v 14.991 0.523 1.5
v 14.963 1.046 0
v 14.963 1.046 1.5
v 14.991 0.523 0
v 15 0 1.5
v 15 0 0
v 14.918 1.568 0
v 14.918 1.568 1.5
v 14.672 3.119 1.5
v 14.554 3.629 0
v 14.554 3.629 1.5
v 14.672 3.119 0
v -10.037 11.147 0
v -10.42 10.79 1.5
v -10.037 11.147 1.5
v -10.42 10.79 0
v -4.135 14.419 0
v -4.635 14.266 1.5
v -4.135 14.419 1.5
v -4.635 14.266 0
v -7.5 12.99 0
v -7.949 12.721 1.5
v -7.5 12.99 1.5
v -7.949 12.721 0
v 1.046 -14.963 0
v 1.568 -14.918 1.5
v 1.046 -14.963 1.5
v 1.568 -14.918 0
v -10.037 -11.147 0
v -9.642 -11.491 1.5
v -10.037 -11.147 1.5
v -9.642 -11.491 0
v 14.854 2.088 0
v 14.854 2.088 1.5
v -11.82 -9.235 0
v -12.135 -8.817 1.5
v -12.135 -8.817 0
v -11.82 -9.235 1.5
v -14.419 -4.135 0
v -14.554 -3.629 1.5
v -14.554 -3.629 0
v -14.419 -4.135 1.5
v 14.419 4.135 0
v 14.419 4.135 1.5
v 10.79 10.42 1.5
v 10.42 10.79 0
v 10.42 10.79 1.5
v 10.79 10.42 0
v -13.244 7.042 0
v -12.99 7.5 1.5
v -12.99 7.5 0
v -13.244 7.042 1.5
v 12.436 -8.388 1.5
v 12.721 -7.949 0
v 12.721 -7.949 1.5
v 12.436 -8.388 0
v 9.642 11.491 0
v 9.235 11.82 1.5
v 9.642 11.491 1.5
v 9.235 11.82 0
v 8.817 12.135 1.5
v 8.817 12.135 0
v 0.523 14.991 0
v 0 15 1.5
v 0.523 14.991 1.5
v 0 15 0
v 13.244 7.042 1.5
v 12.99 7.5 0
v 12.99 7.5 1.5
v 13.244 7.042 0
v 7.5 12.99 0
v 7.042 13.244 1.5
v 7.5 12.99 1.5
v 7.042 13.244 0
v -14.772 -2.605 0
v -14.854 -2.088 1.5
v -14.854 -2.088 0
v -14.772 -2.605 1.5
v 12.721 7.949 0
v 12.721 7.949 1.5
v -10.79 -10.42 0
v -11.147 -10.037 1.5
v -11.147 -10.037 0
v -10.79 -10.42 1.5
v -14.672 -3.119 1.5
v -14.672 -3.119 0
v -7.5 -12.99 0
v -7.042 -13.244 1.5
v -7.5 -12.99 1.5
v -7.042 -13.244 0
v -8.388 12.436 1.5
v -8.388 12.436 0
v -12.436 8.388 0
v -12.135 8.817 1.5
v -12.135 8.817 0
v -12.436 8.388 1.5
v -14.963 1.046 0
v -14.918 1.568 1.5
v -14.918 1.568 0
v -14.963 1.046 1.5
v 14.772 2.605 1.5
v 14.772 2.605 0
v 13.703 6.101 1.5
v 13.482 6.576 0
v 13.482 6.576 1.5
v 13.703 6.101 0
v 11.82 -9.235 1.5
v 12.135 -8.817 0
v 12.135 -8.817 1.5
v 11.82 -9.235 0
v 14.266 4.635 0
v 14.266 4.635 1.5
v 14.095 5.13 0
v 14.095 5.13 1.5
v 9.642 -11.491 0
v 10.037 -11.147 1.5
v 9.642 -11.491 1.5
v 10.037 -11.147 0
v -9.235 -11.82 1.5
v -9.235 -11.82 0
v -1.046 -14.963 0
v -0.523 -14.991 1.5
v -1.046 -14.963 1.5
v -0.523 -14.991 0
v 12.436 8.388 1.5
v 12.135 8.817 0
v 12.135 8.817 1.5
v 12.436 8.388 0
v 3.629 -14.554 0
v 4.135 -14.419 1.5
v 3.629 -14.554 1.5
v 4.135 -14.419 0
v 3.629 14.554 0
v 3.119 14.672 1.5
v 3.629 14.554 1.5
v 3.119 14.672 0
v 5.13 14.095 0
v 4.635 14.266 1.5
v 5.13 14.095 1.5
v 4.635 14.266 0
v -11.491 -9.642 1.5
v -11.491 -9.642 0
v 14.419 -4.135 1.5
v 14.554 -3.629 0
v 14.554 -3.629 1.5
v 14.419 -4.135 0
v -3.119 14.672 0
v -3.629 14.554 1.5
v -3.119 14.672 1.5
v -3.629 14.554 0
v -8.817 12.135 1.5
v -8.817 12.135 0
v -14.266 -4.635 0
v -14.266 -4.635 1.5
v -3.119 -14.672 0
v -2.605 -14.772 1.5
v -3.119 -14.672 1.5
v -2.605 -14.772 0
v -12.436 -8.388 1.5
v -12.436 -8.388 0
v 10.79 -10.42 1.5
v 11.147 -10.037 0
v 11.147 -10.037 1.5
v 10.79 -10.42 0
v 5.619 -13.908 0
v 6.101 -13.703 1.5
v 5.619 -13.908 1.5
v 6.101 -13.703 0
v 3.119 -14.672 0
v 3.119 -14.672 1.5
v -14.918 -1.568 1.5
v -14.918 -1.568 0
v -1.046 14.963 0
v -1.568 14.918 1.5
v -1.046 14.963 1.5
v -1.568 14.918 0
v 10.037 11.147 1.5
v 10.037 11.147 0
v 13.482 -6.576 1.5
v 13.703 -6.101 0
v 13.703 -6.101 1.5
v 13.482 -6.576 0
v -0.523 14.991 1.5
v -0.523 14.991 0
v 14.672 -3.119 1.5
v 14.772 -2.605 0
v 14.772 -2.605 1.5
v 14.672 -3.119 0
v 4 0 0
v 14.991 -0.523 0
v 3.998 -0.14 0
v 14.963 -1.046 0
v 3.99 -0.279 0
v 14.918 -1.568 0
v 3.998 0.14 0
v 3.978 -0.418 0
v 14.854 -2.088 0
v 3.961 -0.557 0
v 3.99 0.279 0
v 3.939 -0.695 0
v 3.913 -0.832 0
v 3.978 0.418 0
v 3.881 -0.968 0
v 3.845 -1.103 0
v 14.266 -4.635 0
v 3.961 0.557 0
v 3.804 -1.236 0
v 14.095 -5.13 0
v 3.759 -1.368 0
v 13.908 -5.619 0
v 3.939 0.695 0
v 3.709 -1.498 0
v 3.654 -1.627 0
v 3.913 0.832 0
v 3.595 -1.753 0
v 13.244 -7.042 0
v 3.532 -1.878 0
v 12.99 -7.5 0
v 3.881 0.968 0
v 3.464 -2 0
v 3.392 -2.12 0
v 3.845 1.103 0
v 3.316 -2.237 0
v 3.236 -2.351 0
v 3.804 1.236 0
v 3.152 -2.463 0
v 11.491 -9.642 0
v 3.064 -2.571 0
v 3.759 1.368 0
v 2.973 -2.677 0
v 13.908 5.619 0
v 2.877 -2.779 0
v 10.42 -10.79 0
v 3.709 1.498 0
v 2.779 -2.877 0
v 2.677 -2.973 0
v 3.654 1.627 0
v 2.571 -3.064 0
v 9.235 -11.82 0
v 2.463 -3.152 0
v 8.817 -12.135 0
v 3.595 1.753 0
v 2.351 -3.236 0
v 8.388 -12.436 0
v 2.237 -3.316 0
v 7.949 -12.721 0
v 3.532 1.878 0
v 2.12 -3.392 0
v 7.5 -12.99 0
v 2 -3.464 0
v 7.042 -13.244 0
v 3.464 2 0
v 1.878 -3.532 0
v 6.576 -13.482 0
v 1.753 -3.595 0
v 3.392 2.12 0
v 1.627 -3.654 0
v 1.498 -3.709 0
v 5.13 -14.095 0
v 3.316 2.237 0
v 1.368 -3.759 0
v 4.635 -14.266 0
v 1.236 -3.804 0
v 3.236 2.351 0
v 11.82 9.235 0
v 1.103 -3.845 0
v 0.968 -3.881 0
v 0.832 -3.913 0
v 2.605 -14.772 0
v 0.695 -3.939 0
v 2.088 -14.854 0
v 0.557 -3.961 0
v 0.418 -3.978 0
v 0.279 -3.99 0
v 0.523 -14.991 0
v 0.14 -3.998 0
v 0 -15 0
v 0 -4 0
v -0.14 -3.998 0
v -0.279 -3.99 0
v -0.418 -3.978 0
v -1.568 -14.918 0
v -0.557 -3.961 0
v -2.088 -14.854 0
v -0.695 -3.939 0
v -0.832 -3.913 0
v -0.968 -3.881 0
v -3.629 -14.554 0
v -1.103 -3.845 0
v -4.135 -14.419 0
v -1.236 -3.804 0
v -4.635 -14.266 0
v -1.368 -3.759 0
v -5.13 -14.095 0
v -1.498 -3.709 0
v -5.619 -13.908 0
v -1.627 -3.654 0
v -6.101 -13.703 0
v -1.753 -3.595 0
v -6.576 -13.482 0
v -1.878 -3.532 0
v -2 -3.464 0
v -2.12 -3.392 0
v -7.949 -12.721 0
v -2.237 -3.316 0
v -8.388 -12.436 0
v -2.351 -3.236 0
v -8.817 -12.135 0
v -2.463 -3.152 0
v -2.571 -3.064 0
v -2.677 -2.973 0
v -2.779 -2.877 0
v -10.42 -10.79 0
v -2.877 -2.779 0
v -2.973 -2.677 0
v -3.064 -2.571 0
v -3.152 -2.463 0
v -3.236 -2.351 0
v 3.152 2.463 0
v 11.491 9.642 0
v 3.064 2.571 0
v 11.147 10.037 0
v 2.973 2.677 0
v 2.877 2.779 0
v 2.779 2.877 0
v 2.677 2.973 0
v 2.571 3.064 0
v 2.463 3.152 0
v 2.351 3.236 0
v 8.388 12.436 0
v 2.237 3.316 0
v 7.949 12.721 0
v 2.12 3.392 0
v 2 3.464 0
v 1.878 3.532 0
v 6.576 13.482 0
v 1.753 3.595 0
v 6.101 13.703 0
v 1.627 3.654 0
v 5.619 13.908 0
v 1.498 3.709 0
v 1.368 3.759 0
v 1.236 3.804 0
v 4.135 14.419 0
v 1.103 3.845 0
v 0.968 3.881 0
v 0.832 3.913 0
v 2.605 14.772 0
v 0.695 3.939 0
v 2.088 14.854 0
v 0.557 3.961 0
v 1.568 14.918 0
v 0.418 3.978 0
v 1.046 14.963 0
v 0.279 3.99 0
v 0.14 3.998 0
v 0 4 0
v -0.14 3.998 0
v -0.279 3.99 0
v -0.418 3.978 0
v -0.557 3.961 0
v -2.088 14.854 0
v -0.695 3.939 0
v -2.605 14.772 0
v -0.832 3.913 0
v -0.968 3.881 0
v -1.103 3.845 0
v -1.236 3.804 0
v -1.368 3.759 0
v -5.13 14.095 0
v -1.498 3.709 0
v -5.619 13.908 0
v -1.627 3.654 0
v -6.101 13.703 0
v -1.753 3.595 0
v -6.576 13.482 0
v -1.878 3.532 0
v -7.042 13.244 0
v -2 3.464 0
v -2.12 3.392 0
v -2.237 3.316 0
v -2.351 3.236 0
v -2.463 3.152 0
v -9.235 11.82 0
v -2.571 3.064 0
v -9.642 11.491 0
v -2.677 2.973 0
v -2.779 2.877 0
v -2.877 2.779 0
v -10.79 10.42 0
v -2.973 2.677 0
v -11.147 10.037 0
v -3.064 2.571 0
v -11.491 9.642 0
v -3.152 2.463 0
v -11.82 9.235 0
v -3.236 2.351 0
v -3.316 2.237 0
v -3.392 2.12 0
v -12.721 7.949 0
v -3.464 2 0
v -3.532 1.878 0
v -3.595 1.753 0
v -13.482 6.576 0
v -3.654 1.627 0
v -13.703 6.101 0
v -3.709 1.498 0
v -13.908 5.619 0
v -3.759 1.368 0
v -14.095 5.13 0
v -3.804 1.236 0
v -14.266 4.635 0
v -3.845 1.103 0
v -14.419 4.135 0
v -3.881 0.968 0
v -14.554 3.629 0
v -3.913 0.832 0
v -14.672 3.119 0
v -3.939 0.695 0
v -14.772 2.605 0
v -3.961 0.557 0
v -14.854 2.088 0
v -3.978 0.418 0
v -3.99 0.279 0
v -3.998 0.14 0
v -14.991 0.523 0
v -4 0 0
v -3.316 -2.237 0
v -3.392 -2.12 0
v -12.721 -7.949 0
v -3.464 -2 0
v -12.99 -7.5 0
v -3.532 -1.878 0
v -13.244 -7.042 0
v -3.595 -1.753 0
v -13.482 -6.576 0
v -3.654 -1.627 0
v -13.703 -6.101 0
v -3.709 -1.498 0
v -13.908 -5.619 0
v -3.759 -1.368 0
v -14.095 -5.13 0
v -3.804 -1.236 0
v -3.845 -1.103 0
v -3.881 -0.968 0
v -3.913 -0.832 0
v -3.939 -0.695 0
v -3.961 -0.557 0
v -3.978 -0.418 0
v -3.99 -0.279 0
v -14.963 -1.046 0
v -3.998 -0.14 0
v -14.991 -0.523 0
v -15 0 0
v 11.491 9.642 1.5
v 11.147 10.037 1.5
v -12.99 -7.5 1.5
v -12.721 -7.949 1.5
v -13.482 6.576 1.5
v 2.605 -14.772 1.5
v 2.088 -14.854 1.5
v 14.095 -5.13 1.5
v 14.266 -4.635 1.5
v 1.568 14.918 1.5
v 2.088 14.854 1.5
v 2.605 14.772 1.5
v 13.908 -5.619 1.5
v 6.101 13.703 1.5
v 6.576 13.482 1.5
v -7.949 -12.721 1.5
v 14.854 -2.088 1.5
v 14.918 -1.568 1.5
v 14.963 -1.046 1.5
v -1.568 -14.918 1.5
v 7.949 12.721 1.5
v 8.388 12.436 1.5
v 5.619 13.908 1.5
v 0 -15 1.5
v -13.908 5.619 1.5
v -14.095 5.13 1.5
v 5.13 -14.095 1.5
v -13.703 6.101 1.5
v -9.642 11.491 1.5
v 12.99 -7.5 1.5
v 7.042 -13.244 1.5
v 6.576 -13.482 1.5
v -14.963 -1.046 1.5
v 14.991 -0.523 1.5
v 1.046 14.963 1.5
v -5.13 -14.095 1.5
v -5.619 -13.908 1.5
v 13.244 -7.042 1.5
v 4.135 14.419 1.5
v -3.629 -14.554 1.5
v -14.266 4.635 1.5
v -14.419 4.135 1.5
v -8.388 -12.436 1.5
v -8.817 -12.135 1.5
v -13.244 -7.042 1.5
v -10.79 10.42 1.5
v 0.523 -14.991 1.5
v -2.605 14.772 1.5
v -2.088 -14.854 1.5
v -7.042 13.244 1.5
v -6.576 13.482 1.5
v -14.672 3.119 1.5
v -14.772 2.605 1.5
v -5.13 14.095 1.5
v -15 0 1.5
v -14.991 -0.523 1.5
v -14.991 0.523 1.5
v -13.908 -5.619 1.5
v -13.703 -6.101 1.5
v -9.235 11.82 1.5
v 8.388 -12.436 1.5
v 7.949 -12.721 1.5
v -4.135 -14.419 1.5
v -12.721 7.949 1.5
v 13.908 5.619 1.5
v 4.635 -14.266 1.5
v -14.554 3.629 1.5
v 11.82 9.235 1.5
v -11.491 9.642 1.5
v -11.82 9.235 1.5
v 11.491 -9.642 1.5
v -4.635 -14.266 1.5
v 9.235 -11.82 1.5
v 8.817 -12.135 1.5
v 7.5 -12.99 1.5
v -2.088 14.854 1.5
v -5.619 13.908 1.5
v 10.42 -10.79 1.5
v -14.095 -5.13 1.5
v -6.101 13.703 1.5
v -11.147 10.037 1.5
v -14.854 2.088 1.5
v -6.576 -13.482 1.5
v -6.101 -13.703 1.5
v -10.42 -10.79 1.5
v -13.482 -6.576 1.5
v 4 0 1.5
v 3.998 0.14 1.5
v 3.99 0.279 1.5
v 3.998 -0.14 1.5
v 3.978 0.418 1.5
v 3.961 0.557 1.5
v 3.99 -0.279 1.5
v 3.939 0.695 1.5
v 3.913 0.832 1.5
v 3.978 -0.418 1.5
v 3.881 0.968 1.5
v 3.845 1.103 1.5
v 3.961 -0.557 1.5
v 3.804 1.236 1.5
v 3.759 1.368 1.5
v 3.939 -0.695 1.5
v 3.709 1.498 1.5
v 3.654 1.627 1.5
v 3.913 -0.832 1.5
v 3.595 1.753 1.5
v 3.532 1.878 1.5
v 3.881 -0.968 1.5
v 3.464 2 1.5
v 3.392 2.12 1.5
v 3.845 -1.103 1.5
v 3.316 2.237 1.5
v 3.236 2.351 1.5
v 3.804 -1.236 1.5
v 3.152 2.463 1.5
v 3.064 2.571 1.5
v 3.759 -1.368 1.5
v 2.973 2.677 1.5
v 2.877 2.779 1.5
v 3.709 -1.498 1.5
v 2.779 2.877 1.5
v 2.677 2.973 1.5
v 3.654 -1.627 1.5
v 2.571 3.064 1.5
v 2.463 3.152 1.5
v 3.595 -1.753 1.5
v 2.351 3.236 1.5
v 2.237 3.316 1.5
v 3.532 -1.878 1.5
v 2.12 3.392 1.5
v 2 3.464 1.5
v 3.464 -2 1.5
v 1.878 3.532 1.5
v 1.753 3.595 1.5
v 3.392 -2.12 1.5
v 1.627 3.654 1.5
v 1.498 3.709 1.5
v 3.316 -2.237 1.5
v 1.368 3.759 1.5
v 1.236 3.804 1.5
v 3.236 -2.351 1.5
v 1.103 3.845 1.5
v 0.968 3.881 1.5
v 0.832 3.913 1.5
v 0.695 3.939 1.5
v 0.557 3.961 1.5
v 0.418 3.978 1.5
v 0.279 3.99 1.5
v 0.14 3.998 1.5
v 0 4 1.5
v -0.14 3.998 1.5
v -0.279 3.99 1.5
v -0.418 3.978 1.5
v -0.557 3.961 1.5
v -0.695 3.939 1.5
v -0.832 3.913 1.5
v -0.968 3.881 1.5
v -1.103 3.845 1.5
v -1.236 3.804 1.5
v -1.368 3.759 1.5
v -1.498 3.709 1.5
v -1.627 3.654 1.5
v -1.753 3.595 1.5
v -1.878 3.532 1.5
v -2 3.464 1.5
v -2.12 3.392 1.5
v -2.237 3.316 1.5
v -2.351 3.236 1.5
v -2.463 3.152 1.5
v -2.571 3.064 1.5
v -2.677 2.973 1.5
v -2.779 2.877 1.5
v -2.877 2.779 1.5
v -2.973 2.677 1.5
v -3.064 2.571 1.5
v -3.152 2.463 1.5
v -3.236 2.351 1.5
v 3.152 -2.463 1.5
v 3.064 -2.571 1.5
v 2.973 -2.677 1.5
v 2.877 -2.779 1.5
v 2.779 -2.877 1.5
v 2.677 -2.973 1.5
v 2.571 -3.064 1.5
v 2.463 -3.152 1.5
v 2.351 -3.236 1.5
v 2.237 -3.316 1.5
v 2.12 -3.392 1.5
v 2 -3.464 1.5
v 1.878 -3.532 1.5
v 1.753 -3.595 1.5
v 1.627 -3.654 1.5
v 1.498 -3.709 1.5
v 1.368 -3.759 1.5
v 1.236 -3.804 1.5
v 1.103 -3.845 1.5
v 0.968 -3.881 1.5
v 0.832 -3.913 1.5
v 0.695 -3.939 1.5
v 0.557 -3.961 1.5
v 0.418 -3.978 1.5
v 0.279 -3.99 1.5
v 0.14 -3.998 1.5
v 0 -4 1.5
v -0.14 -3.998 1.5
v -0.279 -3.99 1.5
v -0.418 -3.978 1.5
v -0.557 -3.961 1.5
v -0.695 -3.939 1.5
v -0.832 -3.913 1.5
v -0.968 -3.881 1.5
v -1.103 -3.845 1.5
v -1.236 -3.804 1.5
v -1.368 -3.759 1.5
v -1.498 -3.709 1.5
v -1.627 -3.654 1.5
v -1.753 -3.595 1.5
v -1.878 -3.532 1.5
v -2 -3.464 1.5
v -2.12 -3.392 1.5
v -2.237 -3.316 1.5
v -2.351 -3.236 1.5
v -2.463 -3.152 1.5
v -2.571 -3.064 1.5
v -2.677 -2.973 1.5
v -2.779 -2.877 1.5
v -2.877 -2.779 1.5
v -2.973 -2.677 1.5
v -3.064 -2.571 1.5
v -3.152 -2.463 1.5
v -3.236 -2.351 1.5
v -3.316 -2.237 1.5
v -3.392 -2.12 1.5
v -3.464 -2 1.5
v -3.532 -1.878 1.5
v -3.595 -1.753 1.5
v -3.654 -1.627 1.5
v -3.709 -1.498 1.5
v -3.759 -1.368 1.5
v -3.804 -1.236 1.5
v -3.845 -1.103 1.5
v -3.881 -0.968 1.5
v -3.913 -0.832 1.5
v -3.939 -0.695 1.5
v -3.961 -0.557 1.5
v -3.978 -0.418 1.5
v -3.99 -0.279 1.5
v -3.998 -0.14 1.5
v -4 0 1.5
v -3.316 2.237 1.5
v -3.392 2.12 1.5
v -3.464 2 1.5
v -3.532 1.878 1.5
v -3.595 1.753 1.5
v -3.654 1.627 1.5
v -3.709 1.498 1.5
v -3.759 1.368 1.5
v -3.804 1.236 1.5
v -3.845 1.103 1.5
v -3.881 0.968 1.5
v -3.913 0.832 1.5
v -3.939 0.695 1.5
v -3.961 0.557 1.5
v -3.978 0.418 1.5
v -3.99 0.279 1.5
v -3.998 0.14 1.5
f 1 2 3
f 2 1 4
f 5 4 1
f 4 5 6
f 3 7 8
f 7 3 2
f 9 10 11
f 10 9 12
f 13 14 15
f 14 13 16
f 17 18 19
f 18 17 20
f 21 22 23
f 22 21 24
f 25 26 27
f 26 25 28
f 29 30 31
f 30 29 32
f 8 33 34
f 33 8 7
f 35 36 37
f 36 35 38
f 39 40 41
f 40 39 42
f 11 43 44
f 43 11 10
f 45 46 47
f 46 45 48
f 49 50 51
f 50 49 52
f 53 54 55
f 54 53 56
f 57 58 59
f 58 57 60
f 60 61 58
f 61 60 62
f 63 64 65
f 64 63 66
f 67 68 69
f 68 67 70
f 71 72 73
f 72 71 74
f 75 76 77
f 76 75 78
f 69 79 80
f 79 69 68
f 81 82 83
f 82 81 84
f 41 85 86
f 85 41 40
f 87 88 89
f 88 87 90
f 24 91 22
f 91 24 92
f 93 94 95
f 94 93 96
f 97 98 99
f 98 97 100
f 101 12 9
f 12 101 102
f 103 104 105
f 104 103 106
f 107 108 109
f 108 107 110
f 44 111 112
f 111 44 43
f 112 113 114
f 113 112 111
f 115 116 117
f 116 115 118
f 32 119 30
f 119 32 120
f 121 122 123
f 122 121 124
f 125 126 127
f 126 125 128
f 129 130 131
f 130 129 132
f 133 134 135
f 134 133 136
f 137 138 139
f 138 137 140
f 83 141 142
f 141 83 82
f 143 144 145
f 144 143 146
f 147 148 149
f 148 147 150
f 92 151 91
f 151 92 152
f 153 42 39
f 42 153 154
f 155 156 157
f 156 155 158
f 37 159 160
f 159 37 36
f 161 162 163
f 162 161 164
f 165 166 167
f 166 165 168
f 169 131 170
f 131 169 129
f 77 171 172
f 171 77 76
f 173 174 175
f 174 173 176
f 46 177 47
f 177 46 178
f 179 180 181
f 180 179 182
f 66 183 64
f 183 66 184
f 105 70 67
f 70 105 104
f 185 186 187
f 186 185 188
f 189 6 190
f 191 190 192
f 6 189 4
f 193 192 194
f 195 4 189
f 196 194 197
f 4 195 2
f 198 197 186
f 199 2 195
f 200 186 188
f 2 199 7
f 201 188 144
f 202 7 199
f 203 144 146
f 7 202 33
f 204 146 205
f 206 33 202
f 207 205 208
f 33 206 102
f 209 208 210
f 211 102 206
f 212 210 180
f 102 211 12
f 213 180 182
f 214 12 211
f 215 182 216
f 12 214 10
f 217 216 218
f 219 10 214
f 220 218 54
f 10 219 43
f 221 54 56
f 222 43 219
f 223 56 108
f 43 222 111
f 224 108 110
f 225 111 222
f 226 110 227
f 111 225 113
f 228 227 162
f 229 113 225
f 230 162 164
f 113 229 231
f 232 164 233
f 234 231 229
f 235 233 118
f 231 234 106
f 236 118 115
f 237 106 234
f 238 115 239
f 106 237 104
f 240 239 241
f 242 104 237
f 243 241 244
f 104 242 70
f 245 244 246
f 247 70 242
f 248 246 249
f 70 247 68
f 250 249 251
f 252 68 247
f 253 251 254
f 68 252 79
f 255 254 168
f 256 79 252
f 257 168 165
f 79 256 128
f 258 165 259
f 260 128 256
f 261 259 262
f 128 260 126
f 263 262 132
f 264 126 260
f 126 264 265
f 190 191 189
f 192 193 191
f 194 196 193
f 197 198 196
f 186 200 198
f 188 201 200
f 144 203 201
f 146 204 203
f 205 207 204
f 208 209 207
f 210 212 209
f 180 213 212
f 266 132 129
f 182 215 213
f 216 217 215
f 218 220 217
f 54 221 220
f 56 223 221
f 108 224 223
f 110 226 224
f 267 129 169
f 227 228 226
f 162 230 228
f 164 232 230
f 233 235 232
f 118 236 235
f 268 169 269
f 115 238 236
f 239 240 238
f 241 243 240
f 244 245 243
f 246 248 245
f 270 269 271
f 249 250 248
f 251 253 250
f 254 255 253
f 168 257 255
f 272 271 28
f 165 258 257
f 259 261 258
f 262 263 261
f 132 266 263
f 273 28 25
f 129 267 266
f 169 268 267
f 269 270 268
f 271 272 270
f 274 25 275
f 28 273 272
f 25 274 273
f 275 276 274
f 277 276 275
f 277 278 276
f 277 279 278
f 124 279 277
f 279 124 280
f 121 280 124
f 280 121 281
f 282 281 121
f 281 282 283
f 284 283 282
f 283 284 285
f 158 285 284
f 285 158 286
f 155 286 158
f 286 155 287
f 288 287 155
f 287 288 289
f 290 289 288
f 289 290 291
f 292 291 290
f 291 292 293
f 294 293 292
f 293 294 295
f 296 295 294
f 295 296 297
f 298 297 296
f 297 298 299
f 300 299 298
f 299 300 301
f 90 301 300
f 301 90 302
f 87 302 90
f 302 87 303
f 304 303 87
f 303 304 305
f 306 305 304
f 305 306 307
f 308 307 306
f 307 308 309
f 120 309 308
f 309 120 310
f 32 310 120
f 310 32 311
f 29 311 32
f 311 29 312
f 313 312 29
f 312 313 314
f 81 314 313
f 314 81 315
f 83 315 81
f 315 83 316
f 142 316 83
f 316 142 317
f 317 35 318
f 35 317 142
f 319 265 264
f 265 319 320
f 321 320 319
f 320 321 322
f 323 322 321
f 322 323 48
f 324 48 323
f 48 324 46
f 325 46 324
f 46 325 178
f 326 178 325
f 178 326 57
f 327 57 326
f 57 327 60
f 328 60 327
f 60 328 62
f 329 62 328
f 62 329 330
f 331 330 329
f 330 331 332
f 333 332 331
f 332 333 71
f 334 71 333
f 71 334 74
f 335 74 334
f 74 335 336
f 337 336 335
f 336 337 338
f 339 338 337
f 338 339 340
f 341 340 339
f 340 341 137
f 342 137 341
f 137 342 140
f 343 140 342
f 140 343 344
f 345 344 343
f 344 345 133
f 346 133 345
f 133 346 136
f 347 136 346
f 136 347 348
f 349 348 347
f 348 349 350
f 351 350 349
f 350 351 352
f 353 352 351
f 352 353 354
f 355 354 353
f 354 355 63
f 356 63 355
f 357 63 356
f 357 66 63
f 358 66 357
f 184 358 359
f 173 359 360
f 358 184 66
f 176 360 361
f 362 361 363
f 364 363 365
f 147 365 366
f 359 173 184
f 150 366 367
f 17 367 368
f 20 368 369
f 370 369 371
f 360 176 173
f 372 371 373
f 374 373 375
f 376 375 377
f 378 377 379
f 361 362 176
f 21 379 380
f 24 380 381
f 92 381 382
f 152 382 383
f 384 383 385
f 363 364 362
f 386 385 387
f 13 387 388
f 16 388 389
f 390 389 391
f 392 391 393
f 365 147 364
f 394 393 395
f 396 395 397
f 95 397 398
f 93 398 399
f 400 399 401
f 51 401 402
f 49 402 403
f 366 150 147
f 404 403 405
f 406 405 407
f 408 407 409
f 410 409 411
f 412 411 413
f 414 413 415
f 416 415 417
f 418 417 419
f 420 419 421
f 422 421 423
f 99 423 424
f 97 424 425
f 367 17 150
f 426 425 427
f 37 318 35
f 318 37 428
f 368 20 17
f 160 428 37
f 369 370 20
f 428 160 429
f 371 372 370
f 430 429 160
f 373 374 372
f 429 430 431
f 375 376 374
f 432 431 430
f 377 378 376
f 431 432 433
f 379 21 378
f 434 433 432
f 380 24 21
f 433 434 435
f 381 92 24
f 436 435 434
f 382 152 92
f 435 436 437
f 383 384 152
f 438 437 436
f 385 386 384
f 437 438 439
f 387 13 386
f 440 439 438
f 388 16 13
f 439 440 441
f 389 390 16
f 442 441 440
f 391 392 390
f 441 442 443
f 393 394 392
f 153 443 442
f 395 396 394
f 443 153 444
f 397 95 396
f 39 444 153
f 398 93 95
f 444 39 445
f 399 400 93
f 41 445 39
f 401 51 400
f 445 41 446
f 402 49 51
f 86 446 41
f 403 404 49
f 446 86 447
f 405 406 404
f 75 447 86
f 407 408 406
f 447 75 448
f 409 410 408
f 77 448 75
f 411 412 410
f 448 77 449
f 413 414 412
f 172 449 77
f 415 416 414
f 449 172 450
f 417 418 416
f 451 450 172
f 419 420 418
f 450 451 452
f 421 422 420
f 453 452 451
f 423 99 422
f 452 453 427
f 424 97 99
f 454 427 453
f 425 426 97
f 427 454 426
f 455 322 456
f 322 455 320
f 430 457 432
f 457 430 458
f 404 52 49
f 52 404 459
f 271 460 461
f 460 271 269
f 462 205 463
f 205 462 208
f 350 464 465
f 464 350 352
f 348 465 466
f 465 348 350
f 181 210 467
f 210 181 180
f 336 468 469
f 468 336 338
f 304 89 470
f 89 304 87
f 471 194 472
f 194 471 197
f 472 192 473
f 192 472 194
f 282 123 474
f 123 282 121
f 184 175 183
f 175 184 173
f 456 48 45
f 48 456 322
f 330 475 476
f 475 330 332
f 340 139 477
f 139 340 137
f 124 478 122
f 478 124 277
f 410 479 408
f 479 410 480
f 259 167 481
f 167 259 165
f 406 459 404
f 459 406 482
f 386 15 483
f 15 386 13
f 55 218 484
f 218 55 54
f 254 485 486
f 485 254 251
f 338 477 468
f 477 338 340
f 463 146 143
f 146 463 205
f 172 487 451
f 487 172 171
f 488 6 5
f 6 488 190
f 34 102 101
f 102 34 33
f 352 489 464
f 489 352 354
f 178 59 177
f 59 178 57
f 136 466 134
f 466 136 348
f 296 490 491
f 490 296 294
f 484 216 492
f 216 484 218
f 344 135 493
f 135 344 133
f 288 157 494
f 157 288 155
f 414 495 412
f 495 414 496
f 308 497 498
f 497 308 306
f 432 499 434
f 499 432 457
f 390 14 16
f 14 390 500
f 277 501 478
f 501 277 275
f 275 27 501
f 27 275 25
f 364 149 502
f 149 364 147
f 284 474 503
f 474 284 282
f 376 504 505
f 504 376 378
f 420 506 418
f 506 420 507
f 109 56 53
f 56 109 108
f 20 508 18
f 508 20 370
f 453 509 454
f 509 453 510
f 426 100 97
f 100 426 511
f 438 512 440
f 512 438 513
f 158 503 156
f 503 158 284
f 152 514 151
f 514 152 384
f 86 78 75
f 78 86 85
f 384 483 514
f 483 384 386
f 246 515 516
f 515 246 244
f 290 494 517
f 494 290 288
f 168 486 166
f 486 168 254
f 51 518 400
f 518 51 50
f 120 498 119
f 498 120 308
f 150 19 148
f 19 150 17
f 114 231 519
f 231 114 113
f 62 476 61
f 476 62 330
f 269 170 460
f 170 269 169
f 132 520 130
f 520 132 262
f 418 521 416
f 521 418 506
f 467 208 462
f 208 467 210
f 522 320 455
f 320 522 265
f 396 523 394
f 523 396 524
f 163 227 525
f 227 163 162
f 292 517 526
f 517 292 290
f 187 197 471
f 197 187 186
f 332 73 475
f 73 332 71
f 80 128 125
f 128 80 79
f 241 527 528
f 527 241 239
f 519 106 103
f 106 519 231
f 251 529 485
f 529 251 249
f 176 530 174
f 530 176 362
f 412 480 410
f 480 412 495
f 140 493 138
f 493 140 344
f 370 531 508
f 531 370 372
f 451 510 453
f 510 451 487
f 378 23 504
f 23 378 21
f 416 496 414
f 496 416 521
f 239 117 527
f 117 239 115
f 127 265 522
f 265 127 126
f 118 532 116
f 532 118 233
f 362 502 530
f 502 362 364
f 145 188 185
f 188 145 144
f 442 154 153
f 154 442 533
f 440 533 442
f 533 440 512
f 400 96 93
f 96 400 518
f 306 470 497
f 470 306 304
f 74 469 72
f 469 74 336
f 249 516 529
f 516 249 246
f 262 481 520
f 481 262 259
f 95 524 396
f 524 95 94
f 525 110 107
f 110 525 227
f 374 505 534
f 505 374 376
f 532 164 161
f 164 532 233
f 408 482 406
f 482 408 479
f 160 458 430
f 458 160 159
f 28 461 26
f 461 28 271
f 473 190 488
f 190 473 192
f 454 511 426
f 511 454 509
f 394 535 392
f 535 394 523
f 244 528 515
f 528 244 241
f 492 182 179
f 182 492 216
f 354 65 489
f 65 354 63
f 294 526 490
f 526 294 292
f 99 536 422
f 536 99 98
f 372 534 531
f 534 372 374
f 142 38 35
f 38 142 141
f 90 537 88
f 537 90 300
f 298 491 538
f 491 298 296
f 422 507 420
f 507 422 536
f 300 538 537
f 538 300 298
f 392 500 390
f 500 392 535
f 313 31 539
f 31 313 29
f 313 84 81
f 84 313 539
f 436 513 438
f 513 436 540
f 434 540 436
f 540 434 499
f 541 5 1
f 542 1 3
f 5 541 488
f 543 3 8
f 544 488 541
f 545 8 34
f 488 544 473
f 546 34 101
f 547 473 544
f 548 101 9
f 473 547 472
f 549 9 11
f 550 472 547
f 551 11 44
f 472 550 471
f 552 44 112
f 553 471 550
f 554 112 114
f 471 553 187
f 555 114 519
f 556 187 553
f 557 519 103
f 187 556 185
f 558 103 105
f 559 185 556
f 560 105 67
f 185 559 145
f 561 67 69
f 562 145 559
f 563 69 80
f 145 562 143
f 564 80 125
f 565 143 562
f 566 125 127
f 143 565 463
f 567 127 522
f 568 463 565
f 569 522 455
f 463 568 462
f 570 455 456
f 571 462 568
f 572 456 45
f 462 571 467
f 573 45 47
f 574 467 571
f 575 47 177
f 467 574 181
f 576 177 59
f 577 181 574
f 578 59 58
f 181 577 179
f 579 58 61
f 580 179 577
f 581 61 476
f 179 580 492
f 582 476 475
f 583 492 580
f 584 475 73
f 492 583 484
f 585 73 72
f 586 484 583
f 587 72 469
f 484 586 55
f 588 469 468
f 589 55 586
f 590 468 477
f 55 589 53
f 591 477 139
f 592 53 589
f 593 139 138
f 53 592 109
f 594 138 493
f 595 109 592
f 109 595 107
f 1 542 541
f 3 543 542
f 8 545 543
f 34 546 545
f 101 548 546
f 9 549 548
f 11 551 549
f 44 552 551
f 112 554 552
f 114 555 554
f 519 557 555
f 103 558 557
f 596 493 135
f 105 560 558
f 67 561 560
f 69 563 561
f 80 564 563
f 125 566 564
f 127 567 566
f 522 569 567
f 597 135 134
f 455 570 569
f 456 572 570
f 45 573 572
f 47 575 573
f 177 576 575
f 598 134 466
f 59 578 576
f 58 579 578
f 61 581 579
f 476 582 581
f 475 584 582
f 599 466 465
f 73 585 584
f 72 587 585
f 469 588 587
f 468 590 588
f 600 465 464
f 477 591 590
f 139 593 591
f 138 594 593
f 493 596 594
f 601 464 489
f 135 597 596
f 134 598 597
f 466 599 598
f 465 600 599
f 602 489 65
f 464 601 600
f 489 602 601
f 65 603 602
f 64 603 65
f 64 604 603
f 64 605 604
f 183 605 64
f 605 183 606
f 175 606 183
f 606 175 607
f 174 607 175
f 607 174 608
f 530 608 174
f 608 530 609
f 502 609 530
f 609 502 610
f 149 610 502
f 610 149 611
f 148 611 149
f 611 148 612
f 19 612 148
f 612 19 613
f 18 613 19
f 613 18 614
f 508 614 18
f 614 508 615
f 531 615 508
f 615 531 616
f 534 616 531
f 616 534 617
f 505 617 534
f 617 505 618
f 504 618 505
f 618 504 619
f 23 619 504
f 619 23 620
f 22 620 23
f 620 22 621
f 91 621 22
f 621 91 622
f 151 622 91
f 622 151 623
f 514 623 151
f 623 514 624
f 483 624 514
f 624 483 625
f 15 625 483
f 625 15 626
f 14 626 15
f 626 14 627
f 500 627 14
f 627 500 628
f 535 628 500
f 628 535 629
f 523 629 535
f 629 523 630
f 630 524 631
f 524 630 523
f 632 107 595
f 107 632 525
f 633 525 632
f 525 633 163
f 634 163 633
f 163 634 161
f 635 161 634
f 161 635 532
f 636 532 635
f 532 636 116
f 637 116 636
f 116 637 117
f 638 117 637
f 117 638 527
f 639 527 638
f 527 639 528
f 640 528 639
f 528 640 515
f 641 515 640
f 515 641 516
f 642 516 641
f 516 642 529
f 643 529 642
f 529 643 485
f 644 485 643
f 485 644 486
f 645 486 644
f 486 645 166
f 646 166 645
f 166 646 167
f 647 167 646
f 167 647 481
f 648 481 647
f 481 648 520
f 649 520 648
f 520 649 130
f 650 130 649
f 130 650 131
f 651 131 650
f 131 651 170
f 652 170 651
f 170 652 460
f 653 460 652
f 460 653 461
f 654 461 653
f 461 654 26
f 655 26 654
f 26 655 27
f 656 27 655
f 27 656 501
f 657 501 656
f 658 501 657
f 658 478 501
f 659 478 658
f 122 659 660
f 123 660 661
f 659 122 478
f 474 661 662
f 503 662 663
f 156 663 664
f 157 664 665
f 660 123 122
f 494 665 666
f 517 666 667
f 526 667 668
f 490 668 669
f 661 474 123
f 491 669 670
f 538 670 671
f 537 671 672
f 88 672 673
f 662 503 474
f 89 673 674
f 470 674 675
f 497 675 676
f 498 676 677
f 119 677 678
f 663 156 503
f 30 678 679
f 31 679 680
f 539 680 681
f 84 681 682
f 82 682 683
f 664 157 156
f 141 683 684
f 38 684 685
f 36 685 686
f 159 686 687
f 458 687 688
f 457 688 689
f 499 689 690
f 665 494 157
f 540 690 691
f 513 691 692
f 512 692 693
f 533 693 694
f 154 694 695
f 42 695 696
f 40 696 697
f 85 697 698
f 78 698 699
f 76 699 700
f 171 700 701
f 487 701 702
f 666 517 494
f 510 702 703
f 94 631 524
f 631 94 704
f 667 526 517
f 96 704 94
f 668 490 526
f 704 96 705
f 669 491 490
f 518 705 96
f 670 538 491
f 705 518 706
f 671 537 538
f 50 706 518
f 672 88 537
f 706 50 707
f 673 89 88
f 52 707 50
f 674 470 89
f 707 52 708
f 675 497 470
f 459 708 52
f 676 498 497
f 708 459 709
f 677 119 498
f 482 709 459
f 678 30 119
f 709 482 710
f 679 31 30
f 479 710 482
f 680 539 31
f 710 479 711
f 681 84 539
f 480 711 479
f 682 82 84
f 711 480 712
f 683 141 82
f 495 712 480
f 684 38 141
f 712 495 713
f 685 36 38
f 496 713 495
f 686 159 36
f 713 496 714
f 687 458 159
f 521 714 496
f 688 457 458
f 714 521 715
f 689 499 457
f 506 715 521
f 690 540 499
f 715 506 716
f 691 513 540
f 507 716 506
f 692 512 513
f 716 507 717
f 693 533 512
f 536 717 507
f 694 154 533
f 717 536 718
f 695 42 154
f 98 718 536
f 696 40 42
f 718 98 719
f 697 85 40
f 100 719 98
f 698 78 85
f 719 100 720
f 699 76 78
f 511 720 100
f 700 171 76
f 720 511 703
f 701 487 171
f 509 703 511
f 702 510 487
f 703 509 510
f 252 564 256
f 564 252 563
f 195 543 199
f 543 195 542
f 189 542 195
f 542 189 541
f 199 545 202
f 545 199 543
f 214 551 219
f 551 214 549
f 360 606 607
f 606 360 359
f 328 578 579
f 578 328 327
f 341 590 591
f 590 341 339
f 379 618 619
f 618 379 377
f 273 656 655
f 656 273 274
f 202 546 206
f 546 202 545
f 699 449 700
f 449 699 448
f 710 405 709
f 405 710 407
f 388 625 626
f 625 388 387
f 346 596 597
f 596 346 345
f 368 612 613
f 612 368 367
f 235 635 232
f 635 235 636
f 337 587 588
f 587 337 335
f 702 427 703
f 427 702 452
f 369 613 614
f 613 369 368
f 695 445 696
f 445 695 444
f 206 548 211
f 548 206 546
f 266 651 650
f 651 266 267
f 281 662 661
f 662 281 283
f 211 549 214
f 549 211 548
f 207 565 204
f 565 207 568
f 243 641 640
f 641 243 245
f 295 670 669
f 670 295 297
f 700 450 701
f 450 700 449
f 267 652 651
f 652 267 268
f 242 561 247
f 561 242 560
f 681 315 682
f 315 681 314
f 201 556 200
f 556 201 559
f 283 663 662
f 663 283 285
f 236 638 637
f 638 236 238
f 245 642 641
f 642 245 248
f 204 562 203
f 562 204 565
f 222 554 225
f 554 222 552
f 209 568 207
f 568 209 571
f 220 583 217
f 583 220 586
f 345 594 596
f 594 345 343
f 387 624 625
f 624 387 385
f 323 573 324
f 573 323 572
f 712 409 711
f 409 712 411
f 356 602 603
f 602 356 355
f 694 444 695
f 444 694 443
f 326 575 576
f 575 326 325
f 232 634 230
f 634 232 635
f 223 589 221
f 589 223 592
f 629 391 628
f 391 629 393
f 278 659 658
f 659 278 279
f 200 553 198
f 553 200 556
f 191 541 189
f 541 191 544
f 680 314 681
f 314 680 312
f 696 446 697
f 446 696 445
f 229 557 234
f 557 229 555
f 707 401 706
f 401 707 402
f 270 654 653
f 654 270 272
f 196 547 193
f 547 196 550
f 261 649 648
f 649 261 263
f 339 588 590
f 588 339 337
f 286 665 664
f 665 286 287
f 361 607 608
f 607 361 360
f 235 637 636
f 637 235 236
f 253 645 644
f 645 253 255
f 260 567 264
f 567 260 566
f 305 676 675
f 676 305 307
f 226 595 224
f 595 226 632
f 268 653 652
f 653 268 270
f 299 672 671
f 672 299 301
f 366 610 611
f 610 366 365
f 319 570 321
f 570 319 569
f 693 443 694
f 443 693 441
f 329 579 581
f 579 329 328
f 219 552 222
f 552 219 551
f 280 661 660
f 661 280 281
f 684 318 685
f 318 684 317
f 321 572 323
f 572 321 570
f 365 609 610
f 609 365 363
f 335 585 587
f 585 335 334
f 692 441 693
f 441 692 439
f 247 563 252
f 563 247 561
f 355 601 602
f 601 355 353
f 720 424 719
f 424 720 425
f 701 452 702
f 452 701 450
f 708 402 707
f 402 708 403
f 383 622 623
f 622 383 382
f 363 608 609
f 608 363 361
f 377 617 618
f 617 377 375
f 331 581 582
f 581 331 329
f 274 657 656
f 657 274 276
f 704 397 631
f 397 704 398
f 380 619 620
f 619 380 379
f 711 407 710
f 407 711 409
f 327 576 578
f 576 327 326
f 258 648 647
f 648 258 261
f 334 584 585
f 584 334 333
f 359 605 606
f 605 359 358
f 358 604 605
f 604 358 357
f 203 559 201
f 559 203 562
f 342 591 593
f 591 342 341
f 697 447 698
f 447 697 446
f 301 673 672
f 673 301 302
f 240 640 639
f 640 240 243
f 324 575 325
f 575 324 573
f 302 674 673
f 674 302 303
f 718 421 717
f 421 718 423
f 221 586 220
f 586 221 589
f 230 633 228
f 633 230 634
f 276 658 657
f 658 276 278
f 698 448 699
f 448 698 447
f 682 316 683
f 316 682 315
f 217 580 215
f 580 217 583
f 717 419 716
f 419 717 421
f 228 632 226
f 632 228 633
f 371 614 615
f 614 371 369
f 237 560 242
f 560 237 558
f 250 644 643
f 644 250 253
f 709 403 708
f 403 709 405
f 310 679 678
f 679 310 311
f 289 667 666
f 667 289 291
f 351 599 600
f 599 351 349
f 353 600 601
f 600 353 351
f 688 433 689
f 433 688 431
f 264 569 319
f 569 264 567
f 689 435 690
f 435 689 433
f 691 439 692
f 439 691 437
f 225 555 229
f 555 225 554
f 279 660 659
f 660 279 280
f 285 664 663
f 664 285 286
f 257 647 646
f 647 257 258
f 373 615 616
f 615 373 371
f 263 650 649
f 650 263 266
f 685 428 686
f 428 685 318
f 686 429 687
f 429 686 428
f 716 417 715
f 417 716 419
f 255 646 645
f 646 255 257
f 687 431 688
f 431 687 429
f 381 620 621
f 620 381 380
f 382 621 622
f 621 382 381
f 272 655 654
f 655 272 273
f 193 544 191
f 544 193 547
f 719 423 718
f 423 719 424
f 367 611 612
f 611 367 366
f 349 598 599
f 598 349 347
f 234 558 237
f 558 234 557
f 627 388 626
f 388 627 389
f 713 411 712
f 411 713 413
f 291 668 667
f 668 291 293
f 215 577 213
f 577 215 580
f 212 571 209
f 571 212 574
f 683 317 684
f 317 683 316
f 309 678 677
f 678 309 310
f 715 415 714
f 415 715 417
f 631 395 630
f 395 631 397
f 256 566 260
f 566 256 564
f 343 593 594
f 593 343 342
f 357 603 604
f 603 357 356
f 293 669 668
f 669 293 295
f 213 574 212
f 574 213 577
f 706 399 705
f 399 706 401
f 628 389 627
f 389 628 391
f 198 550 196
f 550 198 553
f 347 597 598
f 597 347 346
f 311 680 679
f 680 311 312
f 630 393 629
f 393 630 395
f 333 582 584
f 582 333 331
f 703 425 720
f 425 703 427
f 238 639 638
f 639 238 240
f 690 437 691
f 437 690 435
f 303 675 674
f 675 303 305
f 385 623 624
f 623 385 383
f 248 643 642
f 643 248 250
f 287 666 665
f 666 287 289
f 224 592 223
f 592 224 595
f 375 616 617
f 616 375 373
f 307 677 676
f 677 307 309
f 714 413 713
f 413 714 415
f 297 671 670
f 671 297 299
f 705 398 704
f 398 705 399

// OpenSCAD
$fn = 180;

inner_d = 8.0;
outer_d = 30.0;
thickness = 1.5;

difference() {
  cylinder(d = outer_d, h = thickness);
  translate([0, 0, -0.1])
    cylinder(d = inner_d, h = thickness + 0.2);
}
